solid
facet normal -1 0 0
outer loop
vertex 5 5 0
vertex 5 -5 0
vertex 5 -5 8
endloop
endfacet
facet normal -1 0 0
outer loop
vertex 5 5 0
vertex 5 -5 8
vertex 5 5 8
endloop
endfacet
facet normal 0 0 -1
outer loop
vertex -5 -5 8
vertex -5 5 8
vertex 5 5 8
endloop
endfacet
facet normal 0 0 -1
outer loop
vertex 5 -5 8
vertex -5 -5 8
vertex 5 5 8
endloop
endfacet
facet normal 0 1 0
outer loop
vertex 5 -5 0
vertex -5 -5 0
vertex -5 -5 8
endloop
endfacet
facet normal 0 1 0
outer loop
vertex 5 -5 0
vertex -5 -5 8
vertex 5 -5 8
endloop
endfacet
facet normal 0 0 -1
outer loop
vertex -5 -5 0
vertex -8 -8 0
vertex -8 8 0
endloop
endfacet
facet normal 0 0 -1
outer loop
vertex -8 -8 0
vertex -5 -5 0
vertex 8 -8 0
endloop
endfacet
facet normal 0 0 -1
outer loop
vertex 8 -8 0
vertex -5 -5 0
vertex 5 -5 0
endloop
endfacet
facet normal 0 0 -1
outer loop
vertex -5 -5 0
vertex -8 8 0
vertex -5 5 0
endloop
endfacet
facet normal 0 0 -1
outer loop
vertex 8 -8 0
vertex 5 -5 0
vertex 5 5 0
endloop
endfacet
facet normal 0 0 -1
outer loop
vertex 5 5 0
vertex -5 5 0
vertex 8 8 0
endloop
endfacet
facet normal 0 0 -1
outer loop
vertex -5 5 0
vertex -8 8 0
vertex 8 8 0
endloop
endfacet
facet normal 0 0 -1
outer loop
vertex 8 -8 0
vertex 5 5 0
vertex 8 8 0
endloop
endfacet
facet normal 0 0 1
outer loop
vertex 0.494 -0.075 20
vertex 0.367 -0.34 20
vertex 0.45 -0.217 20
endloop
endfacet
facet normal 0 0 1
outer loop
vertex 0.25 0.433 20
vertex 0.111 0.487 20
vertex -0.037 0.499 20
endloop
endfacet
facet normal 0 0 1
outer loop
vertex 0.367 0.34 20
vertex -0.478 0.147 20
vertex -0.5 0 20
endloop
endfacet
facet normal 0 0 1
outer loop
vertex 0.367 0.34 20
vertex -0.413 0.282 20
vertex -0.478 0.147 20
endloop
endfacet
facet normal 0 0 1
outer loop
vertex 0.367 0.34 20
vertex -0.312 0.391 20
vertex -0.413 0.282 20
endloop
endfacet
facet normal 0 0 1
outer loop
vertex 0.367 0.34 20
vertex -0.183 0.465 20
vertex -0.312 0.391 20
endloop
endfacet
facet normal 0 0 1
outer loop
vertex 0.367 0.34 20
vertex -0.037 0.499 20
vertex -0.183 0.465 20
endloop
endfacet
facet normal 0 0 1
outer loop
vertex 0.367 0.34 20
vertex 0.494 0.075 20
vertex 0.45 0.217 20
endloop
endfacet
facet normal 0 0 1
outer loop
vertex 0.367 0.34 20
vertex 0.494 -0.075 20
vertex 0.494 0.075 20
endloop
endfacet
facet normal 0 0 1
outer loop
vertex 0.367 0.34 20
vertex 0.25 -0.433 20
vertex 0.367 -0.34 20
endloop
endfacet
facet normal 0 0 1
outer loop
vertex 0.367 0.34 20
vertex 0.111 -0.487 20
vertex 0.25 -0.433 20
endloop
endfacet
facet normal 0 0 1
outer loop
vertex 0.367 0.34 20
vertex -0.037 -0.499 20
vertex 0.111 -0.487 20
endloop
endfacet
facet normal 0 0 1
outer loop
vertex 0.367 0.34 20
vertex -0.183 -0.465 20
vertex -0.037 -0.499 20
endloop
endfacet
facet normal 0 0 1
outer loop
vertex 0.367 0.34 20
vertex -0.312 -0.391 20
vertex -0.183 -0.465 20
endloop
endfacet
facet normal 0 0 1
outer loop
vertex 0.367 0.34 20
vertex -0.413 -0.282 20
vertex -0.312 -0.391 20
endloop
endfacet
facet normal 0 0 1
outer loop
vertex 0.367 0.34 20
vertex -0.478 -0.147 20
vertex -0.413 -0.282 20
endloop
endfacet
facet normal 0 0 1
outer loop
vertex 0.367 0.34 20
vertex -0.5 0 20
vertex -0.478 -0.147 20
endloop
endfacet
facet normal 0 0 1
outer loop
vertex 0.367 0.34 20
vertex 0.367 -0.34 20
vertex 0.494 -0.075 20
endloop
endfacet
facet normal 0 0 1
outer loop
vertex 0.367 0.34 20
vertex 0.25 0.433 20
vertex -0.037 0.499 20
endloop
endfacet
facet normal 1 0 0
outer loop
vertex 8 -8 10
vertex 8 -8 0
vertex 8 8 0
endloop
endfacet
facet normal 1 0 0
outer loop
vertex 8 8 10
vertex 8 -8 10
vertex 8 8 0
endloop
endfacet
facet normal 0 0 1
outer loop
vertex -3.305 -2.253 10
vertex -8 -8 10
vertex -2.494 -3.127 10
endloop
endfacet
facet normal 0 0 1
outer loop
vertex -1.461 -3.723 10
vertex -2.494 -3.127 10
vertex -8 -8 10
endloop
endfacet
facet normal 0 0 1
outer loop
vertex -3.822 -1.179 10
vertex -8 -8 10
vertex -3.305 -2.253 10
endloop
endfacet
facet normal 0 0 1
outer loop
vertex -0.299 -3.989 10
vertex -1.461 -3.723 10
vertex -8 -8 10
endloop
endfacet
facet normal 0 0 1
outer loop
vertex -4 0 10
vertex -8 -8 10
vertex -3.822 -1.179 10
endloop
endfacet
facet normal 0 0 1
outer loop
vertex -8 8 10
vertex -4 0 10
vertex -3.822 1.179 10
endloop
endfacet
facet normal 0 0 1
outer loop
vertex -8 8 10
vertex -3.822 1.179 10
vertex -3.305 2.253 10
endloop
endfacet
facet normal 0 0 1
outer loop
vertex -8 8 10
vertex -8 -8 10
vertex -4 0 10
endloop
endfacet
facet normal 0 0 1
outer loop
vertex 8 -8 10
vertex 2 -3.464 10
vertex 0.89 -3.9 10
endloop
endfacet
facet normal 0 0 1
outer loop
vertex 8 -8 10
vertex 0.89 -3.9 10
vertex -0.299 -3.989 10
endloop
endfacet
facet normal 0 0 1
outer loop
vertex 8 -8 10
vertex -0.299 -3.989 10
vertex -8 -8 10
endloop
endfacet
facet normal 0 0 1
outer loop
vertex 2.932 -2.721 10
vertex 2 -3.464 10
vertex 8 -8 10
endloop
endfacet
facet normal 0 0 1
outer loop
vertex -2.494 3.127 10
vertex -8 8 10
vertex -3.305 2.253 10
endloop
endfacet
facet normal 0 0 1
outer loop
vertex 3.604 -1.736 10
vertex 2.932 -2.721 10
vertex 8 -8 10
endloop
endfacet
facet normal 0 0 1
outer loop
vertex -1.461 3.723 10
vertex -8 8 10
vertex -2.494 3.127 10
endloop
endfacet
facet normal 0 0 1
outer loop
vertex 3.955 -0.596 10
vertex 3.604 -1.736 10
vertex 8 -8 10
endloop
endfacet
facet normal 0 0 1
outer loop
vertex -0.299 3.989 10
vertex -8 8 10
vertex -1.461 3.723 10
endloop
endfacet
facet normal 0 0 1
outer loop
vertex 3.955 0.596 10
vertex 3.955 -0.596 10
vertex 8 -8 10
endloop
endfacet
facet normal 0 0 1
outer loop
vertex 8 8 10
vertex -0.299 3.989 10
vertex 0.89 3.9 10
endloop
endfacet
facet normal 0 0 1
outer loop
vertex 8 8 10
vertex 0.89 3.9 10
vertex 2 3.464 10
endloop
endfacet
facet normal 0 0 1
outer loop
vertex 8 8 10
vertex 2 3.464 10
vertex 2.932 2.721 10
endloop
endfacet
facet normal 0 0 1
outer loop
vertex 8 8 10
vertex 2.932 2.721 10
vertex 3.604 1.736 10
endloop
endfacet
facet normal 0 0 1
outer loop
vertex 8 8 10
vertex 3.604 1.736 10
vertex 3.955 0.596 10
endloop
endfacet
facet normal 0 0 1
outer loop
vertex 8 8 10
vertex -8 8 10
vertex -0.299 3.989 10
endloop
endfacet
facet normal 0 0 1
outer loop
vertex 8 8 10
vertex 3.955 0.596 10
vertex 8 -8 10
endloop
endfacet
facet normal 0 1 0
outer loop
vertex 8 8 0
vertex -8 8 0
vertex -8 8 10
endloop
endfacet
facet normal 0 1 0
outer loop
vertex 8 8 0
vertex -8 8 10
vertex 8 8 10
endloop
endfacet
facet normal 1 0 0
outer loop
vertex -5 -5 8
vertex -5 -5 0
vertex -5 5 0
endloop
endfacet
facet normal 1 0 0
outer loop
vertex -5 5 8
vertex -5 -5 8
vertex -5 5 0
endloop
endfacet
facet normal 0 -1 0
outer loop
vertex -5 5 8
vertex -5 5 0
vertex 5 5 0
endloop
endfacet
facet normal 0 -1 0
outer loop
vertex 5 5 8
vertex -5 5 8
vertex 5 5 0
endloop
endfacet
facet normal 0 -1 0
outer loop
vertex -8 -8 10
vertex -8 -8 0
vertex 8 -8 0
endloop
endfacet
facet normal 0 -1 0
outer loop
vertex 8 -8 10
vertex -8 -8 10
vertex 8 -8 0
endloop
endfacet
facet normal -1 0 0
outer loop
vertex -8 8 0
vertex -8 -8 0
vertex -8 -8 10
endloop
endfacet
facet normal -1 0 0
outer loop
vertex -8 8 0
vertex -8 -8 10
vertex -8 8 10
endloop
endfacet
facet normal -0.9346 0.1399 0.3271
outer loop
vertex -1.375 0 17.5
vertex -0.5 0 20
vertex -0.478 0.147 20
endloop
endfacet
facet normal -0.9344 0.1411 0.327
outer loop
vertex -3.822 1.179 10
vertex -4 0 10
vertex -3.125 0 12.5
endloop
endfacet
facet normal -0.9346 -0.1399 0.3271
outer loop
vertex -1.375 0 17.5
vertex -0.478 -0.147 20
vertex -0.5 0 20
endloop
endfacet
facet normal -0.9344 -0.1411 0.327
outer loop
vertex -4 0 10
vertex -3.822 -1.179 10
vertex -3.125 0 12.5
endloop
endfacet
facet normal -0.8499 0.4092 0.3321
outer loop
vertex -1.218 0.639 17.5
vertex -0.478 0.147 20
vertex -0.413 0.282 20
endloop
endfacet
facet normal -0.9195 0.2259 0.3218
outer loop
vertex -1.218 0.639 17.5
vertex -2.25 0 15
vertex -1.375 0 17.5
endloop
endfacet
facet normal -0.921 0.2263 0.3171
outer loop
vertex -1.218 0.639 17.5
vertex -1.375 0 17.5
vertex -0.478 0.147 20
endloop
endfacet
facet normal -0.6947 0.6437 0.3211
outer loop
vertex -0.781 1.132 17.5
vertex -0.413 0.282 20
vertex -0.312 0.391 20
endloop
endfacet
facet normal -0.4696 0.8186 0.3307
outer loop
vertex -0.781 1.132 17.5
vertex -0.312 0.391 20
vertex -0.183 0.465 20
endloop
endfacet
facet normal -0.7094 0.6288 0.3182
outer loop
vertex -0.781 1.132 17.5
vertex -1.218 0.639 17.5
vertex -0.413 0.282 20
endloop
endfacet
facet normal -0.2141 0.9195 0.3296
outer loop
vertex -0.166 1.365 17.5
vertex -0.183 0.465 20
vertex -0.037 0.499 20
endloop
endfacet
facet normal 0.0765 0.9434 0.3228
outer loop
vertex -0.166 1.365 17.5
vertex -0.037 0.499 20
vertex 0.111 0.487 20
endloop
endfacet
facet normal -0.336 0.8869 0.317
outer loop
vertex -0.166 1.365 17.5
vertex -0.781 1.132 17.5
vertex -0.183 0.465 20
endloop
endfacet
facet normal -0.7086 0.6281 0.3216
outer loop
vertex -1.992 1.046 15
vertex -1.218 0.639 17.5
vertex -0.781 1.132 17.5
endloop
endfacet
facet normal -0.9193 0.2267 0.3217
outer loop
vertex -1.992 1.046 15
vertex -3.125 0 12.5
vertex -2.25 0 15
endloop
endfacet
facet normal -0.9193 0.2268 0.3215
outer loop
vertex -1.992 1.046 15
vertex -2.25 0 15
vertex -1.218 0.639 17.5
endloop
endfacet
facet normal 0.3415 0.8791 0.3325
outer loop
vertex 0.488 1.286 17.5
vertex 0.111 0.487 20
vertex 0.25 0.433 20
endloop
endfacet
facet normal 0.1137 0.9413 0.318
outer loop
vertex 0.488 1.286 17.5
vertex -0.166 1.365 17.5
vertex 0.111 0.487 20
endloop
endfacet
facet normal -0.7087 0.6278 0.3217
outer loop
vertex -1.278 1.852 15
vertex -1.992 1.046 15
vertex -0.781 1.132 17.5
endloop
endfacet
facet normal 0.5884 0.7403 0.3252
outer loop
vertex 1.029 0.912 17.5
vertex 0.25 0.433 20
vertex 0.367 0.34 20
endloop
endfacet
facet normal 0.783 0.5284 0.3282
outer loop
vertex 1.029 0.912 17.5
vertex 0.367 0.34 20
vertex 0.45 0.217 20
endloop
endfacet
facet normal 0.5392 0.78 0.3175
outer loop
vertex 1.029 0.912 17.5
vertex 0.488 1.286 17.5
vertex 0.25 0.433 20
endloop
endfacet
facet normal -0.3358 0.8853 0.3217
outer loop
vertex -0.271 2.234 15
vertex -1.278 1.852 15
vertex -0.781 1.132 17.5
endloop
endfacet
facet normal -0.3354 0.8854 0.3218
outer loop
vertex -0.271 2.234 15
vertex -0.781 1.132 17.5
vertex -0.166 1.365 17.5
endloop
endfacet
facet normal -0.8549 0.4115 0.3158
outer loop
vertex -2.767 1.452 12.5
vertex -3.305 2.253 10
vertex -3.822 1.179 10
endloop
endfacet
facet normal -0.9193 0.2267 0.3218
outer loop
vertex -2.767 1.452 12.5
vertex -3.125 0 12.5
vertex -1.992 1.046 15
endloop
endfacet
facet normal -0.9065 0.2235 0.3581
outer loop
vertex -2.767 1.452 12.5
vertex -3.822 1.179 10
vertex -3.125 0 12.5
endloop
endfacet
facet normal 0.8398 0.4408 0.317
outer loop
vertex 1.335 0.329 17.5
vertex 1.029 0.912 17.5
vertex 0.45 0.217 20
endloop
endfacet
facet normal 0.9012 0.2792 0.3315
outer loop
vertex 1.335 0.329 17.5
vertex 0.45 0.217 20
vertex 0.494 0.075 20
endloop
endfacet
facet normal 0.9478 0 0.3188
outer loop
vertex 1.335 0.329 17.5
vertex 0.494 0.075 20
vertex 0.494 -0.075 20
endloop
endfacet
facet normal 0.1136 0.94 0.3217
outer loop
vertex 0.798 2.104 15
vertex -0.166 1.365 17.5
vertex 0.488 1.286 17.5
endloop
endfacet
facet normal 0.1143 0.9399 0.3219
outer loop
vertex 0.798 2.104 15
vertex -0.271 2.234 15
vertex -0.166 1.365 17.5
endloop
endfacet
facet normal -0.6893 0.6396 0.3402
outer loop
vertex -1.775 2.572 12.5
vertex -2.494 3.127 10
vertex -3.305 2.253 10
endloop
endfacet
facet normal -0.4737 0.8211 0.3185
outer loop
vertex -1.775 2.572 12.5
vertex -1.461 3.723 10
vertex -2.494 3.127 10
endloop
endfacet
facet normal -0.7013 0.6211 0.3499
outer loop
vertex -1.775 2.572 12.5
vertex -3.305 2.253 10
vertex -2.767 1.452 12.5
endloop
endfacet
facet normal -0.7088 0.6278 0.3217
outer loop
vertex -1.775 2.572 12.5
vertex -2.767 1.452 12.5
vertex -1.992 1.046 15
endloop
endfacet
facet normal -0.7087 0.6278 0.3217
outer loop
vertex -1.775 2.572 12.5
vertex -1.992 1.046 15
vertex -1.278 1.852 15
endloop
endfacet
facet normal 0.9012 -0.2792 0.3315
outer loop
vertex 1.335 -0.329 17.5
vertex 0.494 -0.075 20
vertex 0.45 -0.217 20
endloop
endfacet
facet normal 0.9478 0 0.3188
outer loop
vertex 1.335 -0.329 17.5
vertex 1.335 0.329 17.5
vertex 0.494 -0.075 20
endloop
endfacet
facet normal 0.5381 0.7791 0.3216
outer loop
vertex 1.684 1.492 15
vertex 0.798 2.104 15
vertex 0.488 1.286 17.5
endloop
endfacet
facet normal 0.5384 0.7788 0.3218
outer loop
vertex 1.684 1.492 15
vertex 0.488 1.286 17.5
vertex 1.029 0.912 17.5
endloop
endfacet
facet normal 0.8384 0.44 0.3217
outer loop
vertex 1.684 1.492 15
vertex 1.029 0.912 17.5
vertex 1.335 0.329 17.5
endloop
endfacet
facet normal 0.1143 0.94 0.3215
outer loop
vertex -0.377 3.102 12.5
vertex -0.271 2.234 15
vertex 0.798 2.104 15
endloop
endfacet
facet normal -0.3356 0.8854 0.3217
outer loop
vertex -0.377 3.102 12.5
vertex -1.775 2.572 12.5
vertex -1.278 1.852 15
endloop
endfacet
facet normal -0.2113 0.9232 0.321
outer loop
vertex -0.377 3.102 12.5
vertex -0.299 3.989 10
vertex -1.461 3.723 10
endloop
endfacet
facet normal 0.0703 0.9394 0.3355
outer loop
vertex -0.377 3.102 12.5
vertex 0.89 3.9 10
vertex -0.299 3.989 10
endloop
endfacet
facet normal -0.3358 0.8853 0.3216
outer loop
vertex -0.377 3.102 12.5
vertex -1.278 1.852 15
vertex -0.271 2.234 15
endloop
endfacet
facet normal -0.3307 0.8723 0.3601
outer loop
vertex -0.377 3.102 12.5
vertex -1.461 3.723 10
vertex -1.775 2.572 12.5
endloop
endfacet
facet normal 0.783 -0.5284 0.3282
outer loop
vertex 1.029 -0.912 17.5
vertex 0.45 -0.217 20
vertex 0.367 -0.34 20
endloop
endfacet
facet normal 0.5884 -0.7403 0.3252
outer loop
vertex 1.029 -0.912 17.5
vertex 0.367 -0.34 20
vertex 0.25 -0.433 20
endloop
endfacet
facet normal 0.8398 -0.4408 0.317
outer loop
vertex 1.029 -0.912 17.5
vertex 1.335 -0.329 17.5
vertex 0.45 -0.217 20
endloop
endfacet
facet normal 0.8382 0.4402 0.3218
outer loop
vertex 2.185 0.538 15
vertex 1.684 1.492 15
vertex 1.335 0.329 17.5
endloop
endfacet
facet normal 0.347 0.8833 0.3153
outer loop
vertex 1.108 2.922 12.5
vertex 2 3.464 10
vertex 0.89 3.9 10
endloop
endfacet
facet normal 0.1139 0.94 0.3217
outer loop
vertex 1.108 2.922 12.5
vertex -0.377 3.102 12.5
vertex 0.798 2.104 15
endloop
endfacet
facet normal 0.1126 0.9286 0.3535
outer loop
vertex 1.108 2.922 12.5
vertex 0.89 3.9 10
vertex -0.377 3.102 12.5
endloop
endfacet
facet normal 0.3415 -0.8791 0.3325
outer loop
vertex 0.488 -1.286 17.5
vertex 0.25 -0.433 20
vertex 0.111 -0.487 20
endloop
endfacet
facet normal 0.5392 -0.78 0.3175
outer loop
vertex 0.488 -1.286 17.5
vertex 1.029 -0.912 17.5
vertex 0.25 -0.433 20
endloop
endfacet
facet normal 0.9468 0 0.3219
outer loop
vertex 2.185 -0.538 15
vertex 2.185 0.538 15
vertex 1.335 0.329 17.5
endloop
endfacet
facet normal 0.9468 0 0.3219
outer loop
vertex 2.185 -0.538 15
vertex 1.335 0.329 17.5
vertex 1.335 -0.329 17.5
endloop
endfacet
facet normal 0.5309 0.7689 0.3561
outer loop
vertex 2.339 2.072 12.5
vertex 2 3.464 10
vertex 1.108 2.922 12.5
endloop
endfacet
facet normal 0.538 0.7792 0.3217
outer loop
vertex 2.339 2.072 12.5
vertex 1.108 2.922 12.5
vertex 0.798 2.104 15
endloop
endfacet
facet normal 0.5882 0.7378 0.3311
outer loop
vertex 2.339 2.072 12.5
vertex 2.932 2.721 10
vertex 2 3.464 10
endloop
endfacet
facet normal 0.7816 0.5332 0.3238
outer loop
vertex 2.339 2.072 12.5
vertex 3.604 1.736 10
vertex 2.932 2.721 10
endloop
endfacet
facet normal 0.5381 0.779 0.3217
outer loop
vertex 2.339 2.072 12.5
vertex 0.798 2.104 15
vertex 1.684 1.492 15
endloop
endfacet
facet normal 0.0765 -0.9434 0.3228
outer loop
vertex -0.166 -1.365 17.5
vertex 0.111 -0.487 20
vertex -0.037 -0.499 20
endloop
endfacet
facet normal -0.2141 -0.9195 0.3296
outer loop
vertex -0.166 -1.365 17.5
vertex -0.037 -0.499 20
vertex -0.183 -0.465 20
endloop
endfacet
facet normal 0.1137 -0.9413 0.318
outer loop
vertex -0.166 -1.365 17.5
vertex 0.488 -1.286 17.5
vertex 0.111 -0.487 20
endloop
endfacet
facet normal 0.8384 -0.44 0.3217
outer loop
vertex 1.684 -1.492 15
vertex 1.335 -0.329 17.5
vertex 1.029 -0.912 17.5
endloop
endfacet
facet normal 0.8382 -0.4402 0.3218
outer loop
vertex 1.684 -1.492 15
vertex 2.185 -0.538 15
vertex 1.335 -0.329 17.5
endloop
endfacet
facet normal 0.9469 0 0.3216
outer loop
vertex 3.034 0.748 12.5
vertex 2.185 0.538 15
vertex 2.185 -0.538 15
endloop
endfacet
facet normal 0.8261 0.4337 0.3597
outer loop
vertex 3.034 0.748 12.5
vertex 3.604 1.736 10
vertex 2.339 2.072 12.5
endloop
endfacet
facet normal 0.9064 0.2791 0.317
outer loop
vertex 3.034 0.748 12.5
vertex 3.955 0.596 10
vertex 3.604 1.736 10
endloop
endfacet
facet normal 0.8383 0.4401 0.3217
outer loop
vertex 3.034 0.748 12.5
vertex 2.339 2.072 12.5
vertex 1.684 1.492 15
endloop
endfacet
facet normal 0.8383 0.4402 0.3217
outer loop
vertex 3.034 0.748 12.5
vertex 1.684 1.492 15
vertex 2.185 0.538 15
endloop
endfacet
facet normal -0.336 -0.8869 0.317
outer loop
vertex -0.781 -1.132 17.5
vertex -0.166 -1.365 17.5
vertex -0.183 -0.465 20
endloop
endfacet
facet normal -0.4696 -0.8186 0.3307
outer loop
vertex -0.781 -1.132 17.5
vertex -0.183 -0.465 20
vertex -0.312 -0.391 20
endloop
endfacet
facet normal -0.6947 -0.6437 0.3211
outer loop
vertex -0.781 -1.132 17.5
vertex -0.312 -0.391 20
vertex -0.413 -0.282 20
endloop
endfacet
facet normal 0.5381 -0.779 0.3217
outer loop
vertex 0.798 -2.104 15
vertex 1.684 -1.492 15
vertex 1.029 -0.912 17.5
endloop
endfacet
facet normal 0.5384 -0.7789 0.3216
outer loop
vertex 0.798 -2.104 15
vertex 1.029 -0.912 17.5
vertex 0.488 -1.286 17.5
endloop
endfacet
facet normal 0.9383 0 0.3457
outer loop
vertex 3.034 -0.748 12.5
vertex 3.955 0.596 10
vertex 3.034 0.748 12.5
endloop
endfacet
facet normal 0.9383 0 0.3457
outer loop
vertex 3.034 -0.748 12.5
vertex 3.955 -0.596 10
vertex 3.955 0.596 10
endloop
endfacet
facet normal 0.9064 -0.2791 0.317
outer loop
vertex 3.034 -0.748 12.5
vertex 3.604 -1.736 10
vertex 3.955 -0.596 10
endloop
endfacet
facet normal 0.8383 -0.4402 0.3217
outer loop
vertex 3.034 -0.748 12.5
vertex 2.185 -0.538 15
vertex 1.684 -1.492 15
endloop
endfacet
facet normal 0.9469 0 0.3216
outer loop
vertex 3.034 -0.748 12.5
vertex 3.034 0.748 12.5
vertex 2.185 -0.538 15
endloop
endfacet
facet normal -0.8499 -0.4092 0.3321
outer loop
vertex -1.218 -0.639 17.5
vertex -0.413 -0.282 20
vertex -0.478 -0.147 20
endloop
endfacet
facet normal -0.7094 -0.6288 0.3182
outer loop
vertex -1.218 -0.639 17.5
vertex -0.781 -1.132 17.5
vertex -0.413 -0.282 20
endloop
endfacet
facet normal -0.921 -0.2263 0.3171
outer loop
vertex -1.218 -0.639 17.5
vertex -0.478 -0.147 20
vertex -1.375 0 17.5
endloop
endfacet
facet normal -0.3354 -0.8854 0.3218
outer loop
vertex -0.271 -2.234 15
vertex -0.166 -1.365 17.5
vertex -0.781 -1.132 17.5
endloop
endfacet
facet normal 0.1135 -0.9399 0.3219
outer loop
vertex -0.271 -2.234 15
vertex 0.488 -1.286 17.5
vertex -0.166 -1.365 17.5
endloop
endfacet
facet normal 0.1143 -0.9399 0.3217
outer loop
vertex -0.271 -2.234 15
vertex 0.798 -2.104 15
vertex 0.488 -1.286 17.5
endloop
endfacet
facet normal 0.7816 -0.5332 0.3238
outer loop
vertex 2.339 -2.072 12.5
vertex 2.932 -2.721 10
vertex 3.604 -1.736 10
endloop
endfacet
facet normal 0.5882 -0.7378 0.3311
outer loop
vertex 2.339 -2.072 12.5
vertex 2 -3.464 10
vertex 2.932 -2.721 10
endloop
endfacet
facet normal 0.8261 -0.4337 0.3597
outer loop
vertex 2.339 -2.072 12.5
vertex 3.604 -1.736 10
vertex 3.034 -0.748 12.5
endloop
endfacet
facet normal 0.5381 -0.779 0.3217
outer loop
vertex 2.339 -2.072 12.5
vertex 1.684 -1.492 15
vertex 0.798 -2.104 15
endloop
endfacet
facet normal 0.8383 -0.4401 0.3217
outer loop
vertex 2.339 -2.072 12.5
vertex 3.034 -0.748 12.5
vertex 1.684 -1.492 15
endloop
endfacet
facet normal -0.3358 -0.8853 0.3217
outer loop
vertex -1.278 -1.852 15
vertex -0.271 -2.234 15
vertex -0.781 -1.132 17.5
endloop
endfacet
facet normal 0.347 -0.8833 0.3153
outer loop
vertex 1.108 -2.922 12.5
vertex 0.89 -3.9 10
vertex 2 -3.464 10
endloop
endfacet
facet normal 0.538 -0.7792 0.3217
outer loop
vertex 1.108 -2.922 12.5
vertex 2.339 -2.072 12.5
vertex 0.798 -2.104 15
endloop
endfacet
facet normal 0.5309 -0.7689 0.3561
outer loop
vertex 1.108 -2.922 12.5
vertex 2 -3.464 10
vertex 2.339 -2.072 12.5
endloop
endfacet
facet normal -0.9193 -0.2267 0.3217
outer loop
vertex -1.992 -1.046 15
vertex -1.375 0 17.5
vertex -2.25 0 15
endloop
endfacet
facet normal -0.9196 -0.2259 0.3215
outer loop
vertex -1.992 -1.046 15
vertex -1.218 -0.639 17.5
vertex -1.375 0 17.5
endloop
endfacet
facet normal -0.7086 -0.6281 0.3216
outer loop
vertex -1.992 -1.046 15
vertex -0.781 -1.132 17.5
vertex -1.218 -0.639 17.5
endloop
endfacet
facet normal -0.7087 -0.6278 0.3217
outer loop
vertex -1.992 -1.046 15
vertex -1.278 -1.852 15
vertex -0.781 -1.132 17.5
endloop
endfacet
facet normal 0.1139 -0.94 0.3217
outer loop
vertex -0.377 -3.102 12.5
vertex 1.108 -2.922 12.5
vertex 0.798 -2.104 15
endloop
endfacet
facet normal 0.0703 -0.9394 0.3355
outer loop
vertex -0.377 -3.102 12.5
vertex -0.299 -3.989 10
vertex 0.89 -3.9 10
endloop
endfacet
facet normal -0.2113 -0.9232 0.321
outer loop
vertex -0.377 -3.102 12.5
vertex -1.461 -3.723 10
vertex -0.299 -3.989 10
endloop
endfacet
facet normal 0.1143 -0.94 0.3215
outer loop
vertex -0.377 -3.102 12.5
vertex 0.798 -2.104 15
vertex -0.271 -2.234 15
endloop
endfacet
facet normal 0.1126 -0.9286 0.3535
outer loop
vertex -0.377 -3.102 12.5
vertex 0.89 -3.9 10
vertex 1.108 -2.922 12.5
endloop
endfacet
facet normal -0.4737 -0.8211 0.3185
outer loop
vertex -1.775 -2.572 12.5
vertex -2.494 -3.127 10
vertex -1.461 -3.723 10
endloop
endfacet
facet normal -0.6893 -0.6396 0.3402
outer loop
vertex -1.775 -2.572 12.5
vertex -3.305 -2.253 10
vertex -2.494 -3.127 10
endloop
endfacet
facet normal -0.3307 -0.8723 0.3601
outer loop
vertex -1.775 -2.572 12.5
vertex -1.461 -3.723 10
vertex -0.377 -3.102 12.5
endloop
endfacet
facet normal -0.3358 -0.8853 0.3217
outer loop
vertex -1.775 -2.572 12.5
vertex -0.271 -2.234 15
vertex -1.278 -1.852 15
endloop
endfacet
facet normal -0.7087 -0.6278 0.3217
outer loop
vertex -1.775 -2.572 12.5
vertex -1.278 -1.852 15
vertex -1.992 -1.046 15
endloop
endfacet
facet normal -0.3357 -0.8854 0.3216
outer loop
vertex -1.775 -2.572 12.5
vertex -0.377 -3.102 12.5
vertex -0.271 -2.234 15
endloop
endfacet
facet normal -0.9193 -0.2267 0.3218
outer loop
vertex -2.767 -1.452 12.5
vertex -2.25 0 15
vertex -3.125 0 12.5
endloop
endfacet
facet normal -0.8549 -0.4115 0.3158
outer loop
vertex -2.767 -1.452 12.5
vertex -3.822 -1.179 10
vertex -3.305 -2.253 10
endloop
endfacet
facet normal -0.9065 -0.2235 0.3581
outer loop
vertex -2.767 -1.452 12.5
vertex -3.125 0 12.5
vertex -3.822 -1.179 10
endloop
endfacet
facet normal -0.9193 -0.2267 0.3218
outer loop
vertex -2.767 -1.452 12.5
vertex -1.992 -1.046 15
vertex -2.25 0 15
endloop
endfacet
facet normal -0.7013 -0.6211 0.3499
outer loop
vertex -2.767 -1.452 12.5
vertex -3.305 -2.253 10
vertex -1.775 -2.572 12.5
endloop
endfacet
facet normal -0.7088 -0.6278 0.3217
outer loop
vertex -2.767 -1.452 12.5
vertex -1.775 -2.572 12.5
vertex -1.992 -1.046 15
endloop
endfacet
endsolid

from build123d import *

# Parameters (mm, degrees)
BOX001_W     = 10
BOX001_H     = 10
BOX001_DEPTH = 8
BOX_W        = 16
BOX_H        = 16
BOX_DEPTH    = 10


with BuildPart() as cube001:
    # Box001 → Box001 (new body)
    with BuildSketch(Plane(origin=(-5, -5, 0), x_dir=(1, 0, 0), z_dir=(0, 0, 1))):
        with Locations((5, 5)):
            Rectangle(BOX001_W, BOX001_H)
    extrude(amount=BOX001_DEPTH)


with BuildPart() as cone:
    # Cone → Cone (revolve)
    with BuildSketch(Plane(origin=(0, 0, 20), x_dir=(-1, 0, 0), z_dir=(0, -1, 0))):
        Polygon((0, 0), (0.5, 0), (4, 10), (0, 10), align=None)
    revolve(axis=Axis((0, 0, 20), (0, 0, -1)))


with BuildPart() as cut:
    # Box → Box (new body)
    with BuildSketch(Plane(origin=(-8, -8, 0), x_dir=(1, 0, 0), z_dir=(0, 0, 1))):
        with Locations((8, 8)):
            Rectangle(BOX_W, BOX_H)
    extrude(amount=BOX_DEPTH)

    # Fusion: union Cone
    add(cone.part)

    # Cut: cut Cube001
    add(cube001.part, mode=Mode.SUBTRACT)


solid = cut.part
